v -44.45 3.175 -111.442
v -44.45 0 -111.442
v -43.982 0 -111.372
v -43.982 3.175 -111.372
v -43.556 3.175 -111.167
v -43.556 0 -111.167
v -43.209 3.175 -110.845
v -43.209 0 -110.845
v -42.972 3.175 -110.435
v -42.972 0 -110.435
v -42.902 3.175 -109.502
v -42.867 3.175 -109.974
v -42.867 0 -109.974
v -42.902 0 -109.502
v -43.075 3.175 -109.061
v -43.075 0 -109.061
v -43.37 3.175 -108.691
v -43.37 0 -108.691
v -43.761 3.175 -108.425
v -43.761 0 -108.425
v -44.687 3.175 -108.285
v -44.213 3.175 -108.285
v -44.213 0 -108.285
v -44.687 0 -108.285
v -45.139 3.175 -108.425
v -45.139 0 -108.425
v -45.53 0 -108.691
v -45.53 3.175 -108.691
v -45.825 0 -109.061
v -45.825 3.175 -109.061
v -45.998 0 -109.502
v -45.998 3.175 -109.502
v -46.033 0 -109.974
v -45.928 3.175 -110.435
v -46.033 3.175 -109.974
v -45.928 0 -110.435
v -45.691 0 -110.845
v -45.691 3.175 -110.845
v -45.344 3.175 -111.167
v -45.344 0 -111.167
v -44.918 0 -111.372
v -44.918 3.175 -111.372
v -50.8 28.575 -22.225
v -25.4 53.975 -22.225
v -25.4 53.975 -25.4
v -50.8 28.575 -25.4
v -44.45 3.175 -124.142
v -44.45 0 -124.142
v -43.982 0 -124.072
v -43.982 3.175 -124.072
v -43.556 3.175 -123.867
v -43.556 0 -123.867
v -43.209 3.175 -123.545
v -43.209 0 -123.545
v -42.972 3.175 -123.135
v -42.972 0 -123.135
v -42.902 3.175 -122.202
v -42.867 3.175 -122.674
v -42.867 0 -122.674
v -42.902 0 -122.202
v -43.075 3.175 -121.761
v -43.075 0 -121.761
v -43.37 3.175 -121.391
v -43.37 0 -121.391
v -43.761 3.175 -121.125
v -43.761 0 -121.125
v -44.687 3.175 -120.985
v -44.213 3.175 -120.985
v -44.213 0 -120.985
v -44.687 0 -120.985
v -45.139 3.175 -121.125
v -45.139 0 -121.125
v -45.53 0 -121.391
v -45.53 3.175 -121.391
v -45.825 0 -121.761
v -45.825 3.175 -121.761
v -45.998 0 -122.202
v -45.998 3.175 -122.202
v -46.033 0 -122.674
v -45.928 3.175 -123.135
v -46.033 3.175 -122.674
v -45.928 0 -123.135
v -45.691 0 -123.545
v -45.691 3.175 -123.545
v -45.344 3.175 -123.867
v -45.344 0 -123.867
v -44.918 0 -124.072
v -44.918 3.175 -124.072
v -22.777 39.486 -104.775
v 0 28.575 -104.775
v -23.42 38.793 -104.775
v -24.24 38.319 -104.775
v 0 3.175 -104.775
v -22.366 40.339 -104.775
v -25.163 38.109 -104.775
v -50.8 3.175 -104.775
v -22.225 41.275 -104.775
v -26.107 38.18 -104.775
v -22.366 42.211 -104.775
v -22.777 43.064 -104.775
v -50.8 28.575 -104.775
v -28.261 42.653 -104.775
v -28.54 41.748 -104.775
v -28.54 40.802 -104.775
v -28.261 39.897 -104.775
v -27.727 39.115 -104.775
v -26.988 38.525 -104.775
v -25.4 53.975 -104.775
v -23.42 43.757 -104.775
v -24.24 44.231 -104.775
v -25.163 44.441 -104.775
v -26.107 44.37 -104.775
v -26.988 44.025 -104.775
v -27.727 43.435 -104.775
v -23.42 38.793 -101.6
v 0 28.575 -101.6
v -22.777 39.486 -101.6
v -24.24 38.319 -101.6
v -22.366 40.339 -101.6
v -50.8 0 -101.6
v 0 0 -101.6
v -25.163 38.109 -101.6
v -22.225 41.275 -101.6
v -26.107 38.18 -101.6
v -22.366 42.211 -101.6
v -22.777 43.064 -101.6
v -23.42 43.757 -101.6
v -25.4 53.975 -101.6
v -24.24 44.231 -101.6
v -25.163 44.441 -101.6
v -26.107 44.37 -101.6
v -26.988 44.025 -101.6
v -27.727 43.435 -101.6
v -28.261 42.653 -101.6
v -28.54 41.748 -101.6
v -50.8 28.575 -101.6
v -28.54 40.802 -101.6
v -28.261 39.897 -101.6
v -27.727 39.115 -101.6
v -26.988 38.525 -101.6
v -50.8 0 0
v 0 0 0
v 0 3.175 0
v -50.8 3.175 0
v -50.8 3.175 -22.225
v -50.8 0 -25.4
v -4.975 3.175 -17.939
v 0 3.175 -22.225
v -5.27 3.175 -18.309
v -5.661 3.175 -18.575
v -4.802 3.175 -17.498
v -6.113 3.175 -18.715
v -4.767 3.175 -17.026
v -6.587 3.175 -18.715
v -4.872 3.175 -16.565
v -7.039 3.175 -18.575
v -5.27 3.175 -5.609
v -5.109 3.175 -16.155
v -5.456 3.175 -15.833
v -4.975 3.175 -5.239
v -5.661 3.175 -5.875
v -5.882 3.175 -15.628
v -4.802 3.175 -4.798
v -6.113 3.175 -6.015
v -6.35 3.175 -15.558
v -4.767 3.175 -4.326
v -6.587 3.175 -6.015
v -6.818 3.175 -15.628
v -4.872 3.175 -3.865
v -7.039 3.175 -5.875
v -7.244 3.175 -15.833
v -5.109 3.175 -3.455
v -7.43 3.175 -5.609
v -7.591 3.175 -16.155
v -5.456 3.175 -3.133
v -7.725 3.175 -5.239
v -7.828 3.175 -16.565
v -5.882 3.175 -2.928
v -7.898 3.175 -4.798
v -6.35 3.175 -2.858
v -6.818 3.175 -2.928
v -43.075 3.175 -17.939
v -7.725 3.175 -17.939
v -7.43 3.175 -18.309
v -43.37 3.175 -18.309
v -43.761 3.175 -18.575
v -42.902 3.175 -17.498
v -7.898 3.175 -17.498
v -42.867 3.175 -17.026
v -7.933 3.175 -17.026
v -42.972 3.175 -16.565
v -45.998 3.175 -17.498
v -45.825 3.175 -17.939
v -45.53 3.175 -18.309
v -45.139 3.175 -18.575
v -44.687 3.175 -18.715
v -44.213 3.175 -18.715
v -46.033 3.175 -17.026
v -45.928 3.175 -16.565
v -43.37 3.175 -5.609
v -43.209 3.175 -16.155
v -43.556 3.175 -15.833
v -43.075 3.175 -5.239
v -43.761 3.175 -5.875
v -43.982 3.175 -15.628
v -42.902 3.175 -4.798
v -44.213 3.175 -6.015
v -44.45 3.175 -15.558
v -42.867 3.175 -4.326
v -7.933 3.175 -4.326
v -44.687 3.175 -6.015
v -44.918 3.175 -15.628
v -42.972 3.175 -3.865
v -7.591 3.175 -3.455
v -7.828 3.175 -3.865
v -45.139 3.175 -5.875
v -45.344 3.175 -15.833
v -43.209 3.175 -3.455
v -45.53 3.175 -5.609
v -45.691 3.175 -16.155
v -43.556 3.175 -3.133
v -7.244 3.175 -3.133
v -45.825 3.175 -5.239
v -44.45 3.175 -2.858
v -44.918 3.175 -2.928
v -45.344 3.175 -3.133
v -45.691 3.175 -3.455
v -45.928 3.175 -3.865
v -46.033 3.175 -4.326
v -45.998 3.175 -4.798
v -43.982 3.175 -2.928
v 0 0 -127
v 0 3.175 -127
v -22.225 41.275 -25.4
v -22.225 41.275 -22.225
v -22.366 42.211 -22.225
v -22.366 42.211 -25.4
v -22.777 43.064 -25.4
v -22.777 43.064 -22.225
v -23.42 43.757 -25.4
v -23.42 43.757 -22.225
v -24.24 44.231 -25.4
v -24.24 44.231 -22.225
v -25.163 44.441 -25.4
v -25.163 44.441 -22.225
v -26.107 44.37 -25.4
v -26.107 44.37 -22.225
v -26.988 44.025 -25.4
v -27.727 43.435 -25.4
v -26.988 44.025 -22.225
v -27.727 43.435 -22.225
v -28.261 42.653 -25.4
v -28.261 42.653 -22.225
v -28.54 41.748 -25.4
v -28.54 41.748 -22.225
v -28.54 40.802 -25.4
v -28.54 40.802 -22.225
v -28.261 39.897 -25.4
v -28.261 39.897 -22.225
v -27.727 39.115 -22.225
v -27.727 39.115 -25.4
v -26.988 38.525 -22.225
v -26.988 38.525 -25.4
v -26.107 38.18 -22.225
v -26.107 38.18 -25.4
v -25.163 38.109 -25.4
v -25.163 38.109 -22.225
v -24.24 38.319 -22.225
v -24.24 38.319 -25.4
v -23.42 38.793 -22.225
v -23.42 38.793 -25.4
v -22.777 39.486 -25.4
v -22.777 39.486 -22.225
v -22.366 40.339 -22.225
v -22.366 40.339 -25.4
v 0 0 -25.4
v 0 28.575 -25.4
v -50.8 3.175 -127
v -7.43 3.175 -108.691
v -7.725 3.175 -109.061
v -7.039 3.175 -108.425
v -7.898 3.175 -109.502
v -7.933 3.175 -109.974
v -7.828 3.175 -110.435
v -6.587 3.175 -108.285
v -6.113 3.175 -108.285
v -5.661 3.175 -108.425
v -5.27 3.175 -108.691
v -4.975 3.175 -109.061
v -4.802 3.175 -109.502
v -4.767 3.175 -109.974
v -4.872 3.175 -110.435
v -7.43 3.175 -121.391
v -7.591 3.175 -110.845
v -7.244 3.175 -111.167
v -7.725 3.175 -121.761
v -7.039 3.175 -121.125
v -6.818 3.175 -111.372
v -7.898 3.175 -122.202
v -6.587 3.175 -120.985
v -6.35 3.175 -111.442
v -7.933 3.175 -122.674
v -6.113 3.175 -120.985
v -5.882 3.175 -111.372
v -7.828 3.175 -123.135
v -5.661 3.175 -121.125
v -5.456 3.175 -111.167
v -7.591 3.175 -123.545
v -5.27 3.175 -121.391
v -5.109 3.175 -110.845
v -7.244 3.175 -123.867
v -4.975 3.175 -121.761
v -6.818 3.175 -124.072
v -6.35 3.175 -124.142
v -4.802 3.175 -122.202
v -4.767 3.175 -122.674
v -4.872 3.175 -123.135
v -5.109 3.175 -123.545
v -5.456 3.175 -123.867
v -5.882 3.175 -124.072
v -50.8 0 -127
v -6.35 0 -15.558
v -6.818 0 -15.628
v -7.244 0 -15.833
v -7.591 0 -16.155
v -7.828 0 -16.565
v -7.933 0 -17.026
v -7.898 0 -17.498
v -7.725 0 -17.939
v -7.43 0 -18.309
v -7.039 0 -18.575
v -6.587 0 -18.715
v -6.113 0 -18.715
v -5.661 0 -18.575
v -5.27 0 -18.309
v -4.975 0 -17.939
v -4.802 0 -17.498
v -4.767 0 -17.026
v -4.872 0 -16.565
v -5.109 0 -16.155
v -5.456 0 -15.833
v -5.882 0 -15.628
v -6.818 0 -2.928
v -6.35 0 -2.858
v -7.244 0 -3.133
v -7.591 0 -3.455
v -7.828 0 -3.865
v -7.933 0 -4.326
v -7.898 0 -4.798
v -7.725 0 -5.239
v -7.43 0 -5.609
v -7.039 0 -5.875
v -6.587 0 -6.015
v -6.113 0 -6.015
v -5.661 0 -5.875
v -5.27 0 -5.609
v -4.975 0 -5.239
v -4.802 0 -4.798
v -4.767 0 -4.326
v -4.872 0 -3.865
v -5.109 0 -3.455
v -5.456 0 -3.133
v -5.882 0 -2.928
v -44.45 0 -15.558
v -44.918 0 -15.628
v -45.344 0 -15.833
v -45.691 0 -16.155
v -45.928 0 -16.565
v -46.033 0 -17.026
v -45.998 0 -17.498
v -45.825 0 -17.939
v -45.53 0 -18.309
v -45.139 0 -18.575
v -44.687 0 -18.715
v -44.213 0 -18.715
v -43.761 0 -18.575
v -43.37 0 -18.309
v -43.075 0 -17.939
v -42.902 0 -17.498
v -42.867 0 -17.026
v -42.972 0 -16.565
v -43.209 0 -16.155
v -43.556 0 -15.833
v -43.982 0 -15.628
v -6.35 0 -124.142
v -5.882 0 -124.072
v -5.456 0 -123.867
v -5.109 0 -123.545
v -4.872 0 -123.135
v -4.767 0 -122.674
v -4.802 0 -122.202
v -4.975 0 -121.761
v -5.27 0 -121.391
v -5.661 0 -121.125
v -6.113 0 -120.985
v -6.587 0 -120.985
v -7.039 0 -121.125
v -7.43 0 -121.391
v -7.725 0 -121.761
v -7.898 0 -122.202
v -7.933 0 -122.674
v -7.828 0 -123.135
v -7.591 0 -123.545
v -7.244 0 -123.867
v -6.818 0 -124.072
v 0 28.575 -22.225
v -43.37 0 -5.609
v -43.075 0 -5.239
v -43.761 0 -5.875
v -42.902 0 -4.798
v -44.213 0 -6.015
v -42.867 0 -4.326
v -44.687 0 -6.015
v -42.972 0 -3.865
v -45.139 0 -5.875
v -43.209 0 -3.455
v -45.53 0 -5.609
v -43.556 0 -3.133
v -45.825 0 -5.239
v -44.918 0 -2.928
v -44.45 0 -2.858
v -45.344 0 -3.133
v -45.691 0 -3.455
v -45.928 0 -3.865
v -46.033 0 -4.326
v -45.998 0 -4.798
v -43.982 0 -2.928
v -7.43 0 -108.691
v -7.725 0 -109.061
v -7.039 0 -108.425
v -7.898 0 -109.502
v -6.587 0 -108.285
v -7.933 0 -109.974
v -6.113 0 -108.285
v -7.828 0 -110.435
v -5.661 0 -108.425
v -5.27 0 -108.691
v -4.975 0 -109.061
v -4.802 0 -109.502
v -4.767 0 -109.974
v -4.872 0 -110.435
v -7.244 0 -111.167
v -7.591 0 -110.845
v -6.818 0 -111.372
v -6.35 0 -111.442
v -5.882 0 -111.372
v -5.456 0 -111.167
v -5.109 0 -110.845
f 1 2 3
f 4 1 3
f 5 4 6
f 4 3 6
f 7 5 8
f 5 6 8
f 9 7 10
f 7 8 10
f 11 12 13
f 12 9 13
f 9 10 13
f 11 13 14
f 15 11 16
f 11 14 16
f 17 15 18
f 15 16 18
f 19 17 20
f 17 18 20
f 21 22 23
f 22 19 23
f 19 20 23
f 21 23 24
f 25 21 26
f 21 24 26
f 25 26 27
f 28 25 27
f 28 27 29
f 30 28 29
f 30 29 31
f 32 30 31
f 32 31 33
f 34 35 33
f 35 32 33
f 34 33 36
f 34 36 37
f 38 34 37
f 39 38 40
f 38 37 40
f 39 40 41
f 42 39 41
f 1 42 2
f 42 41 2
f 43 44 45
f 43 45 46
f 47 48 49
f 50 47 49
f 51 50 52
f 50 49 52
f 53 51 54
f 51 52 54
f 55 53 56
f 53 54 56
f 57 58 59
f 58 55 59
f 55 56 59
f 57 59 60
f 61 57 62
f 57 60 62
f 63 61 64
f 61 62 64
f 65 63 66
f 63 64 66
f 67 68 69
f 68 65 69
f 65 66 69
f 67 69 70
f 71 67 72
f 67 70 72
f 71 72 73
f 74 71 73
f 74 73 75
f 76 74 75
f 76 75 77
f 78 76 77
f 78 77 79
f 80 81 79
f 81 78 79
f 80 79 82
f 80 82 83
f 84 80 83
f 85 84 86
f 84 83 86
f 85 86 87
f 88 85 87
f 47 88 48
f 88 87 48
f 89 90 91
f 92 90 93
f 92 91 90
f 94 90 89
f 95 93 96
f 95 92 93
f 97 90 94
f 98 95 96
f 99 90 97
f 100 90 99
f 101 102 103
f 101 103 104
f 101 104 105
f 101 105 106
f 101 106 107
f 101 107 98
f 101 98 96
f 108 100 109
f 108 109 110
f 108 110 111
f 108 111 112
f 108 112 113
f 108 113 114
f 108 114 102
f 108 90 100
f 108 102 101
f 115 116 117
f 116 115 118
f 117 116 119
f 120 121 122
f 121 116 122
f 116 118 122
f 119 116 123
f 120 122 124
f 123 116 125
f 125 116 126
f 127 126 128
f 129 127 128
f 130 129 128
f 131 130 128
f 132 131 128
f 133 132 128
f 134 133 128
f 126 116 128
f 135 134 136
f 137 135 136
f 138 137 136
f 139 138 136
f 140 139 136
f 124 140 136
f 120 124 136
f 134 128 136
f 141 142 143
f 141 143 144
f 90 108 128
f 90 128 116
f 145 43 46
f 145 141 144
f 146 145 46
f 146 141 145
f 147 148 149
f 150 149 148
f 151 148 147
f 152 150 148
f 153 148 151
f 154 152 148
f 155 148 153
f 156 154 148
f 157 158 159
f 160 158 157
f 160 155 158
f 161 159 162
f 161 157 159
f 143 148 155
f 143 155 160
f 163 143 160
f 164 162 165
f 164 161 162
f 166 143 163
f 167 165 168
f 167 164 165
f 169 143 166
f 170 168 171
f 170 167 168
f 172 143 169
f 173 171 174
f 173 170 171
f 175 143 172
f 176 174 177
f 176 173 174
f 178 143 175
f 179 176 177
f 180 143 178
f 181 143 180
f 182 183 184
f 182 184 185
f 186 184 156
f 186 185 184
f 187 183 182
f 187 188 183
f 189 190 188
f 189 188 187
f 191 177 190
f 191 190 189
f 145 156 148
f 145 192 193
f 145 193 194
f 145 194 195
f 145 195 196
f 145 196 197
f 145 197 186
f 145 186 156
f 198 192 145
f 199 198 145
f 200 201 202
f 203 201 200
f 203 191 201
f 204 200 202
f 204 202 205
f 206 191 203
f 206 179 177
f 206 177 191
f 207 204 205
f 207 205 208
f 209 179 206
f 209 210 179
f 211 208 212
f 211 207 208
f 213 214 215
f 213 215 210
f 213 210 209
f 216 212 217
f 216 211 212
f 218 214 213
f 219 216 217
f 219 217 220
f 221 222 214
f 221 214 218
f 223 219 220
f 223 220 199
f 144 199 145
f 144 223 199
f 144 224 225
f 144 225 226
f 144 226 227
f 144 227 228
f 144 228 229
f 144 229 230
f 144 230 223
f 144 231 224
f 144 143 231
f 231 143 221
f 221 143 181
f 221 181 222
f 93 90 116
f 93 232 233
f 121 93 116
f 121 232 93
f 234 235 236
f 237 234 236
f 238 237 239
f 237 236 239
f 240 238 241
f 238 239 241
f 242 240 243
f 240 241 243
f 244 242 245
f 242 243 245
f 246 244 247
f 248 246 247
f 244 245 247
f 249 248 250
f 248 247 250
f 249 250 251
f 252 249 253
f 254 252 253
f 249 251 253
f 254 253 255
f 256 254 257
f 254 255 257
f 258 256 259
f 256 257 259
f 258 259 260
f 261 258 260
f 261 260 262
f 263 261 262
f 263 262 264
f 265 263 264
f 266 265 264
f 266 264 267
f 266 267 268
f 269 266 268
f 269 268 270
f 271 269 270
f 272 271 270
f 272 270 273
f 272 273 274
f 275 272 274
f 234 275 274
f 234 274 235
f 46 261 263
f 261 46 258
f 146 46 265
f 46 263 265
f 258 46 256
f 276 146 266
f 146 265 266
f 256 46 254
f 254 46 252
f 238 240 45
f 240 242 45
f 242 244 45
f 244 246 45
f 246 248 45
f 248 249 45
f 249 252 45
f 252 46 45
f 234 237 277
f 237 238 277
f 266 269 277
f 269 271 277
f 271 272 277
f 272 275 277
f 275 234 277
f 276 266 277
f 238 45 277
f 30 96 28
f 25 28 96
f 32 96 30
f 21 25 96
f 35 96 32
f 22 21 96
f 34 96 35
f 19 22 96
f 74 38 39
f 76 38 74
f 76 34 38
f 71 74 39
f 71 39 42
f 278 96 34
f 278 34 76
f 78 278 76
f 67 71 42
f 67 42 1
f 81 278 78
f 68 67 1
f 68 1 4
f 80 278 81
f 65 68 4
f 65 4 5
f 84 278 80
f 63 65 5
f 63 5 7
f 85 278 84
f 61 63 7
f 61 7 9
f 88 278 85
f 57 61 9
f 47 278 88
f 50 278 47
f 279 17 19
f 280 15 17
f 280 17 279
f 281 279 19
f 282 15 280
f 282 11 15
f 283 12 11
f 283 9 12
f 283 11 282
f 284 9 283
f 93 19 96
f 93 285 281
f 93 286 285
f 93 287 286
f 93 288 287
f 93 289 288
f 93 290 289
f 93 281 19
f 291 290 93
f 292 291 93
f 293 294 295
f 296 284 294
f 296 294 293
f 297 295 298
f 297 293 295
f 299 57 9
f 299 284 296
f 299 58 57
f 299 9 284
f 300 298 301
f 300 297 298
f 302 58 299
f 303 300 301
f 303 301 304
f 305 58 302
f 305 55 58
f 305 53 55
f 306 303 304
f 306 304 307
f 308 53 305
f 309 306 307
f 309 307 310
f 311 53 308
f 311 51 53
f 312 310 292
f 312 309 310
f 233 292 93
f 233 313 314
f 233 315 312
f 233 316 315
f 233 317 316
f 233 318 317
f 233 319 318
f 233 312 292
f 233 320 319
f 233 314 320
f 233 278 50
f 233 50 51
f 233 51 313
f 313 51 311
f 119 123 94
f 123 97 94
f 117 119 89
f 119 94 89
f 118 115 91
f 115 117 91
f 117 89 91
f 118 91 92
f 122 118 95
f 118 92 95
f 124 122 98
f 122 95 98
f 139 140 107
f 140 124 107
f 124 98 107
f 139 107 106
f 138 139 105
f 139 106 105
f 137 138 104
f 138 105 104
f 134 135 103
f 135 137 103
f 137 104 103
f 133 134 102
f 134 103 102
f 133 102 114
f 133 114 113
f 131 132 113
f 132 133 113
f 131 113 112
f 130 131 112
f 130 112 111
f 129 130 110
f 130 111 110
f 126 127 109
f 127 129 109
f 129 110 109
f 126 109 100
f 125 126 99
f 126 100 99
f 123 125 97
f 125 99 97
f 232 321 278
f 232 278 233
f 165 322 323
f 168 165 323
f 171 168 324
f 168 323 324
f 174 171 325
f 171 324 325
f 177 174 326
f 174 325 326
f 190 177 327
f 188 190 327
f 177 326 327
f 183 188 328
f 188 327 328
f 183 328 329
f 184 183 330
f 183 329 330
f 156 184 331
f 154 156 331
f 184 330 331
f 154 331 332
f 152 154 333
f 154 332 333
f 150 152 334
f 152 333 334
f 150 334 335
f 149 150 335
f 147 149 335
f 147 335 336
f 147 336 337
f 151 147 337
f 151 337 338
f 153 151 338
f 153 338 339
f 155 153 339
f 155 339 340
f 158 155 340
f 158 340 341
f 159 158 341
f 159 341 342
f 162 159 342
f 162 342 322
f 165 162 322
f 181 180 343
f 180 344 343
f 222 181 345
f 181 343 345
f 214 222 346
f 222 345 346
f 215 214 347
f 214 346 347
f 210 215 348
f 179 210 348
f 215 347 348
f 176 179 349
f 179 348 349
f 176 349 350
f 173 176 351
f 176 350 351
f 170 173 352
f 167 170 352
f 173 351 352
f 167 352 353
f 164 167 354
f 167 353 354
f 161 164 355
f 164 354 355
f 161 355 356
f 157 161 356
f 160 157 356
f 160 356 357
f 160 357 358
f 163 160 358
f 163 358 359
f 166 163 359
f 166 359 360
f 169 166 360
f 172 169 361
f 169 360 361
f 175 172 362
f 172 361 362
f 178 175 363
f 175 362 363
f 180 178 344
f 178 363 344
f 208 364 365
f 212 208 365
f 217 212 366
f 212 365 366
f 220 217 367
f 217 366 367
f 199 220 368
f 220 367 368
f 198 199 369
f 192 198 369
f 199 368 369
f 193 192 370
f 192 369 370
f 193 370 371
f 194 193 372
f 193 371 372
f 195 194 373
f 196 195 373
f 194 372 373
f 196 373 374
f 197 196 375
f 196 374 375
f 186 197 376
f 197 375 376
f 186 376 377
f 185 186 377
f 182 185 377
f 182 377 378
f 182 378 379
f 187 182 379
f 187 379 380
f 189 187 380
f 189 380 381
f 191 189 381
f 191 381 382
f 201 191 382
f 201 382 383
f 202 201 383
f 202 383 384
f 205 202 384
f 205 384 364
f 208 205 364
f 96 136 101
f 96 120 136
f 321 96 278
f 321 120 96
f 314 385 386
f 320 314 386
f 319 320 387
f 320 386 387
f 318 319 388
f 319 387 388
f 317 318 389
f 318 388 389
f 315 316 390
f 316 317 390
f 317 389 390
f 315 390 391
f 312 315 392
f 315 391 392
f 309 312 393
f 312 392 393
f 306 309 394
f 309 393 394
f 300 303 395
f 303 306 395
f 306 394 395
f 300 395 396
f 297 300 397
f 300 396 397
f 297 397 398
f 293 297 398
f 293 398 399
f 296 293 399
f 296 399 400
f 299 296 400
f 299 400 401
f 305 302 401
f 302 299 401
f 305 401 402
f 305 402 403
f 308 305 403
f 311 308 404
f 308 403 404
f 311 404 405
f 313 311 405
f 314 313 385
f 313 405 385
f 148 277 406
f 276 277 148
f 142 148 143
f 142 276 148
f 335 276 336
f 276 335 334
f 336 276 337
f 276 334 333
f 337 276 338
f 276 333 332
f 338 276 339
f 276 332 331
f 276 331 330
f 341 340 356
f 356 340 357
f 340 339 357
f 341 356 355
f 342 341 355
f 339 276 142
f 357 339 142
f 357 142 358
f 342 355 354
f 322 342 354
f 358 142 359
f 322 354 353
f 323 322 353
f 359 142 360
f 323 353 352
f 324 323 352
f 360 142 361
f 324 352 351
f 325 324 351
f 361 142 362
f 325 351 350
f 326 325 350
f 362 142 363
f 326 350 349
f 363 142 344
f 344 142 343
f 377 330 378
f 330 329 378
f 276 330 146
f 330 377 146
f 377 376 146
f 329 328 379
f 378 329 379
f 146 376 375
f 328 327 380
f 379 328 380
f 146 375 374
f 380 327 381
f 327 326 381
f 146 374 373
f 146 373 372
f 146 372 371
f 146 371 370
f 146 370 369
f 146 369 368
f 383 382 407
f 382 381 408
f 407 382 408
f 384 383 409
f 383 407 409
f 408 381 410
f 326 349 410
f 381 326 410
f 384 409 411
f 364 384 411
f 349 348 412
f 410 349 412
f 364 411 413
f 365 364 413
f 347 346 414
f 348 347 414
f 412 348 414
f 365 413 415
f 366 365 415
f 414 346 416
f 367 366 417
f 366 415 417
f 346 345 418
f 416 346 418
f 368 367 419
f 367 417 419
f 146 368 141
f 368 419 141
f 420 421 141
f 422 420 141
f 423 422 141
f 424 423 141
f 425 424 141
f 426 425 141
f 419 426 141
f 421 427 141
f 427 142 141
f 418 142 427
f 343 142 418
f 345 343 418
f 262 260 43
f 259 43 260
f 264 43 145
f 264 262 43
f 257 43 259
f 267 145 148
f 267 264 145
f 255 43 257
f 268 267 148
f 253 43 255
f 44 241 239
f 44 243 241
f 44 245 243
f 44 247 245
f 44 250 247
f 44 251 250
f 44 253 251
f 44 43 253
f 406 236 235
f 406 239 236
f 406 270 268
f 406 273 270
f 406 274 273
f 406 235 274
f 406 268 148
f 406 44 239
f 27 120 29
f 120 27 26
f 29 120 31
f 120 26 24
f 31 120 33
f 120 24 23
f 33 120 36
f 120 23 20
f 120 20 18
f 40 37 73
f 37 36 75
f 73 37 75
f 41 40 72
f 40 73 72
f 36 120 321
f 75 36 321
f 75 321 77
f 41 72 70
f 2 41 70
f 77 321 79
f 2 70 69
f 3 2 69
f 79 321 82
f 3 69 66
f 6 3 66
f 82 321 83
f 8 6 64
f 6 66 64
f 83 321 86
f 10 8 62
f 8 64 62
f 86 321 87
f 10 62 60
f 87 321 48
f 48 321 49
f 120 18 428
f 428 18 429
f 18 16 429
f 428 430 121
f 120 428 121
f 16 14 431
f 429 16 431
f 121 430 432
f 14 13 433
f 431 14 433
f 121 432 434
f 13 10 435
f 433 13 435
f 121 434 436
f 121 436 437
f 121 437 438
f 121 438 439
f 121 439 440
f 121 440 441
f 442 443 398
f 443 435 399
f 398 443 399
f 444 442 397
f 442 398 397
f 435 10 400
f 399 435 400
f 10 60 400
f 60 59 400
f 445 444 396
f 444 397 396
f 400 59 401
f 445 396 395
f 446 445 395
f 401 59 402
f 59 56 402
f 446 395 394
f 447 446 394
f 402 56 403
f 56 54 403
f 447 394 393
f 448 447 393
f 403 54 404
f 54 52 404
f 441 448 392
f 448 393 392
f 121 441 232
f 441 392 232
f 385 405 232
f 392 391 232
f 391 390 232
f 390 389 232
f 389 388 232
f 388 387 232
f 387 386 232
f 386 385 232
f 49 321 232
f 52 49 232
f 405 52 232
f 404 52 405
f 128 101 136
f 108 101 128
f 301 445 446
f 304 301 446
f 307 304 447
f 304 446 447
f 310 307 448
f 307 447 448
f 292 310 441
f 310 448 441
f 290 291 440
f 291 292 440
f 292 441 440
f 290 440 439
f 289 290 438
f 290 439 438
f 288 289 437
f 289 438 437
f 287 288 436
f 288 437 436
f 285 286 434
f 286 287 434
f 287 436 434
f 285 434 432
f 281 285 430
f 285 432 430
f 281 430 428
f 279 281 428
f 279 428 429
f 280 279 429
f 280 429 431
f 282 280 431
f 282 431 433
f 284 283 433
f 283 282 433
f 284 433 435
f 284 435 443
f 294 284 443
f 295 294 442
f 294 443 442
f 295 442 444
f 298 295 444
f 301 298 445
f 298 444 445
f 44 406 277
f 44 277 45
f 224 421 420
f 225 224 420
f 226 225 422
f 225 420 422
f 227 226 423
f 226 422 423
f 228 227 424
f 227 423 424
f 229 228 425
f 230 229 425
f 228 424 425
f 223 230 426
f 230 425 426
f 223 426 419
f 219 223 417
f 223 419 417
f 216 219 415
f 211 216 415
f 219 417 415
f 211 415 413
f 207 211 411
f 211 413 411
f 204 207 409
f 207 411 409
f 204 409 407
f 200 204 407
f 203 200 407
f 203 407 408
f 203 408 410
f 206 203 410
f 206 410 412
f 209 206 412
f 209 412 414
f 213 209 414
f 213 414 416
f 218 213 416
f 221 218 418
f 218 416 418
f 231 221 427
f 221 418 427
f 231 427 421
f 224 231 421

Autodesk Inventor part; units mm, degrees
ref_plane "YZ Plane" through (0, 0, 0) normal (1, 0, 0) x (0, 1, 0)
ref_plane "XZ Plane" through (0, 0, 0) normal (0, 1, 0) x (-1, 0, 0)
sketch "Sketch1" plane through (0, 0, 0) normal (0, 1, 0) x (-1, 0, 0)
  line L0 (0, 0) -> (50.8, 0)
  line L1 (50.8, 0) -> (50.8, -25.4)
  line L2 (50.8, -25.4) -> (0, -25.4)
  line L3 (0, -25.4) -> (0, 0)
  dimension "d0" = 50.8
  dimension "d1" = 25.4
extrude "Extrusion1" add sketch "Sketch1" along normal blind 3.175
sketch "Sketch2" plane through (0, 3.175, 0) normal (0, 1, 0) x (1, 0, 0)
  line L0 (0, 0) -> (0, 25.4) projected
  line L1 (-50.8, 25.4) -> (-50.8, 0) projected
  line L2 (0, 25.4) -> (-50.8, 25.4)
  line L3 (-50.8, 25.4) -> (-50.8, 22.225)
  line L4 (-50.8, 22.225) -> (0, 22.225)
  line L5 (0, 22.225) -> (0, 25.4)
  dimension "d4" = 3.175
extrude "Extrusion2" add sketch "Sketch2" along normal blind 25.4
sketch "Sketch3" plane through (-50.8, 3.175, -22.225) normal (0, 0, 1) x (1, 0, 0)
  line L0 (0, -3.175) -> (0, 25.4) projected
  line L1 (50.8, 25.4) -> (0, 25.4) projected
  line L2 (0, 25.4) -> (50.8, 25.4)
  line L3 (50.8, 25.4) -> (25.4, 50.8)
  line L4 (25.4, 50.8) -> (0, 25.4)
  point P0 (50.8, -3.175)
  dimension "d7" = 25.4
extrude "Extrusion3" add sketch "Sketch3" against normal blind 3.175
sketch "Sketch4" plane through (-50.8, 3.175, -22.225) normal (0, 0, 1) x (1, 0, 0)
  circle A0 centre (25.4, 38.1) radius 3.175
  point P0 (50.8, -3.175)
  point P1 (25.4, 50.8)
  dimension "d10" = 6.35
  dimension "d11" = 12.7
extrude "Extrusion4" cut sketch "Sketch4" against normal blind 3.175
sketch "Sketch5" plane through (0, 3.175, 0) normal (0, 1, 0) x (1, 0, 0)
  line L0 (-44.45, 4.445) -> (-6.35, 4.445)
  line L1 (-6.35, 4.445) -> (-6.35, 17.145)
  line L2 (-6.35, 17.145) -> (-44.45, 17.145)
  line L3 (-44.45, 17.145) -> (-44.45, 4.445)
  line L4 (-50.8, 0) -> (0, 0) projected
  line L5 (-50.8, 22.225) -> (-50.8, 0) projected
  dimension "d14" = 38.1
  dimension "d15" = 12.7
  dimension "d16" = 4.445
  dimension "d17" = 6.35
hole "Hole1" at (-44.45, 3.175, -17.145) at (-6.35, 3.175, -17.145) at (-6.35, 3.175, -4.445) at (-44.45, 3.175, -4.445) direction (0, -1, 0) diameter 3.175 end through all
ref_plane "Work Plane1" through (0, 0, -63.5) normal (0, 0, -1) x (-1, 0, 0)
mirror "Mirror1" about plane through (0, 0, -63.5) normal (0, 0, -1)
properties part number "Intake - Piston Mounting Brackets"
